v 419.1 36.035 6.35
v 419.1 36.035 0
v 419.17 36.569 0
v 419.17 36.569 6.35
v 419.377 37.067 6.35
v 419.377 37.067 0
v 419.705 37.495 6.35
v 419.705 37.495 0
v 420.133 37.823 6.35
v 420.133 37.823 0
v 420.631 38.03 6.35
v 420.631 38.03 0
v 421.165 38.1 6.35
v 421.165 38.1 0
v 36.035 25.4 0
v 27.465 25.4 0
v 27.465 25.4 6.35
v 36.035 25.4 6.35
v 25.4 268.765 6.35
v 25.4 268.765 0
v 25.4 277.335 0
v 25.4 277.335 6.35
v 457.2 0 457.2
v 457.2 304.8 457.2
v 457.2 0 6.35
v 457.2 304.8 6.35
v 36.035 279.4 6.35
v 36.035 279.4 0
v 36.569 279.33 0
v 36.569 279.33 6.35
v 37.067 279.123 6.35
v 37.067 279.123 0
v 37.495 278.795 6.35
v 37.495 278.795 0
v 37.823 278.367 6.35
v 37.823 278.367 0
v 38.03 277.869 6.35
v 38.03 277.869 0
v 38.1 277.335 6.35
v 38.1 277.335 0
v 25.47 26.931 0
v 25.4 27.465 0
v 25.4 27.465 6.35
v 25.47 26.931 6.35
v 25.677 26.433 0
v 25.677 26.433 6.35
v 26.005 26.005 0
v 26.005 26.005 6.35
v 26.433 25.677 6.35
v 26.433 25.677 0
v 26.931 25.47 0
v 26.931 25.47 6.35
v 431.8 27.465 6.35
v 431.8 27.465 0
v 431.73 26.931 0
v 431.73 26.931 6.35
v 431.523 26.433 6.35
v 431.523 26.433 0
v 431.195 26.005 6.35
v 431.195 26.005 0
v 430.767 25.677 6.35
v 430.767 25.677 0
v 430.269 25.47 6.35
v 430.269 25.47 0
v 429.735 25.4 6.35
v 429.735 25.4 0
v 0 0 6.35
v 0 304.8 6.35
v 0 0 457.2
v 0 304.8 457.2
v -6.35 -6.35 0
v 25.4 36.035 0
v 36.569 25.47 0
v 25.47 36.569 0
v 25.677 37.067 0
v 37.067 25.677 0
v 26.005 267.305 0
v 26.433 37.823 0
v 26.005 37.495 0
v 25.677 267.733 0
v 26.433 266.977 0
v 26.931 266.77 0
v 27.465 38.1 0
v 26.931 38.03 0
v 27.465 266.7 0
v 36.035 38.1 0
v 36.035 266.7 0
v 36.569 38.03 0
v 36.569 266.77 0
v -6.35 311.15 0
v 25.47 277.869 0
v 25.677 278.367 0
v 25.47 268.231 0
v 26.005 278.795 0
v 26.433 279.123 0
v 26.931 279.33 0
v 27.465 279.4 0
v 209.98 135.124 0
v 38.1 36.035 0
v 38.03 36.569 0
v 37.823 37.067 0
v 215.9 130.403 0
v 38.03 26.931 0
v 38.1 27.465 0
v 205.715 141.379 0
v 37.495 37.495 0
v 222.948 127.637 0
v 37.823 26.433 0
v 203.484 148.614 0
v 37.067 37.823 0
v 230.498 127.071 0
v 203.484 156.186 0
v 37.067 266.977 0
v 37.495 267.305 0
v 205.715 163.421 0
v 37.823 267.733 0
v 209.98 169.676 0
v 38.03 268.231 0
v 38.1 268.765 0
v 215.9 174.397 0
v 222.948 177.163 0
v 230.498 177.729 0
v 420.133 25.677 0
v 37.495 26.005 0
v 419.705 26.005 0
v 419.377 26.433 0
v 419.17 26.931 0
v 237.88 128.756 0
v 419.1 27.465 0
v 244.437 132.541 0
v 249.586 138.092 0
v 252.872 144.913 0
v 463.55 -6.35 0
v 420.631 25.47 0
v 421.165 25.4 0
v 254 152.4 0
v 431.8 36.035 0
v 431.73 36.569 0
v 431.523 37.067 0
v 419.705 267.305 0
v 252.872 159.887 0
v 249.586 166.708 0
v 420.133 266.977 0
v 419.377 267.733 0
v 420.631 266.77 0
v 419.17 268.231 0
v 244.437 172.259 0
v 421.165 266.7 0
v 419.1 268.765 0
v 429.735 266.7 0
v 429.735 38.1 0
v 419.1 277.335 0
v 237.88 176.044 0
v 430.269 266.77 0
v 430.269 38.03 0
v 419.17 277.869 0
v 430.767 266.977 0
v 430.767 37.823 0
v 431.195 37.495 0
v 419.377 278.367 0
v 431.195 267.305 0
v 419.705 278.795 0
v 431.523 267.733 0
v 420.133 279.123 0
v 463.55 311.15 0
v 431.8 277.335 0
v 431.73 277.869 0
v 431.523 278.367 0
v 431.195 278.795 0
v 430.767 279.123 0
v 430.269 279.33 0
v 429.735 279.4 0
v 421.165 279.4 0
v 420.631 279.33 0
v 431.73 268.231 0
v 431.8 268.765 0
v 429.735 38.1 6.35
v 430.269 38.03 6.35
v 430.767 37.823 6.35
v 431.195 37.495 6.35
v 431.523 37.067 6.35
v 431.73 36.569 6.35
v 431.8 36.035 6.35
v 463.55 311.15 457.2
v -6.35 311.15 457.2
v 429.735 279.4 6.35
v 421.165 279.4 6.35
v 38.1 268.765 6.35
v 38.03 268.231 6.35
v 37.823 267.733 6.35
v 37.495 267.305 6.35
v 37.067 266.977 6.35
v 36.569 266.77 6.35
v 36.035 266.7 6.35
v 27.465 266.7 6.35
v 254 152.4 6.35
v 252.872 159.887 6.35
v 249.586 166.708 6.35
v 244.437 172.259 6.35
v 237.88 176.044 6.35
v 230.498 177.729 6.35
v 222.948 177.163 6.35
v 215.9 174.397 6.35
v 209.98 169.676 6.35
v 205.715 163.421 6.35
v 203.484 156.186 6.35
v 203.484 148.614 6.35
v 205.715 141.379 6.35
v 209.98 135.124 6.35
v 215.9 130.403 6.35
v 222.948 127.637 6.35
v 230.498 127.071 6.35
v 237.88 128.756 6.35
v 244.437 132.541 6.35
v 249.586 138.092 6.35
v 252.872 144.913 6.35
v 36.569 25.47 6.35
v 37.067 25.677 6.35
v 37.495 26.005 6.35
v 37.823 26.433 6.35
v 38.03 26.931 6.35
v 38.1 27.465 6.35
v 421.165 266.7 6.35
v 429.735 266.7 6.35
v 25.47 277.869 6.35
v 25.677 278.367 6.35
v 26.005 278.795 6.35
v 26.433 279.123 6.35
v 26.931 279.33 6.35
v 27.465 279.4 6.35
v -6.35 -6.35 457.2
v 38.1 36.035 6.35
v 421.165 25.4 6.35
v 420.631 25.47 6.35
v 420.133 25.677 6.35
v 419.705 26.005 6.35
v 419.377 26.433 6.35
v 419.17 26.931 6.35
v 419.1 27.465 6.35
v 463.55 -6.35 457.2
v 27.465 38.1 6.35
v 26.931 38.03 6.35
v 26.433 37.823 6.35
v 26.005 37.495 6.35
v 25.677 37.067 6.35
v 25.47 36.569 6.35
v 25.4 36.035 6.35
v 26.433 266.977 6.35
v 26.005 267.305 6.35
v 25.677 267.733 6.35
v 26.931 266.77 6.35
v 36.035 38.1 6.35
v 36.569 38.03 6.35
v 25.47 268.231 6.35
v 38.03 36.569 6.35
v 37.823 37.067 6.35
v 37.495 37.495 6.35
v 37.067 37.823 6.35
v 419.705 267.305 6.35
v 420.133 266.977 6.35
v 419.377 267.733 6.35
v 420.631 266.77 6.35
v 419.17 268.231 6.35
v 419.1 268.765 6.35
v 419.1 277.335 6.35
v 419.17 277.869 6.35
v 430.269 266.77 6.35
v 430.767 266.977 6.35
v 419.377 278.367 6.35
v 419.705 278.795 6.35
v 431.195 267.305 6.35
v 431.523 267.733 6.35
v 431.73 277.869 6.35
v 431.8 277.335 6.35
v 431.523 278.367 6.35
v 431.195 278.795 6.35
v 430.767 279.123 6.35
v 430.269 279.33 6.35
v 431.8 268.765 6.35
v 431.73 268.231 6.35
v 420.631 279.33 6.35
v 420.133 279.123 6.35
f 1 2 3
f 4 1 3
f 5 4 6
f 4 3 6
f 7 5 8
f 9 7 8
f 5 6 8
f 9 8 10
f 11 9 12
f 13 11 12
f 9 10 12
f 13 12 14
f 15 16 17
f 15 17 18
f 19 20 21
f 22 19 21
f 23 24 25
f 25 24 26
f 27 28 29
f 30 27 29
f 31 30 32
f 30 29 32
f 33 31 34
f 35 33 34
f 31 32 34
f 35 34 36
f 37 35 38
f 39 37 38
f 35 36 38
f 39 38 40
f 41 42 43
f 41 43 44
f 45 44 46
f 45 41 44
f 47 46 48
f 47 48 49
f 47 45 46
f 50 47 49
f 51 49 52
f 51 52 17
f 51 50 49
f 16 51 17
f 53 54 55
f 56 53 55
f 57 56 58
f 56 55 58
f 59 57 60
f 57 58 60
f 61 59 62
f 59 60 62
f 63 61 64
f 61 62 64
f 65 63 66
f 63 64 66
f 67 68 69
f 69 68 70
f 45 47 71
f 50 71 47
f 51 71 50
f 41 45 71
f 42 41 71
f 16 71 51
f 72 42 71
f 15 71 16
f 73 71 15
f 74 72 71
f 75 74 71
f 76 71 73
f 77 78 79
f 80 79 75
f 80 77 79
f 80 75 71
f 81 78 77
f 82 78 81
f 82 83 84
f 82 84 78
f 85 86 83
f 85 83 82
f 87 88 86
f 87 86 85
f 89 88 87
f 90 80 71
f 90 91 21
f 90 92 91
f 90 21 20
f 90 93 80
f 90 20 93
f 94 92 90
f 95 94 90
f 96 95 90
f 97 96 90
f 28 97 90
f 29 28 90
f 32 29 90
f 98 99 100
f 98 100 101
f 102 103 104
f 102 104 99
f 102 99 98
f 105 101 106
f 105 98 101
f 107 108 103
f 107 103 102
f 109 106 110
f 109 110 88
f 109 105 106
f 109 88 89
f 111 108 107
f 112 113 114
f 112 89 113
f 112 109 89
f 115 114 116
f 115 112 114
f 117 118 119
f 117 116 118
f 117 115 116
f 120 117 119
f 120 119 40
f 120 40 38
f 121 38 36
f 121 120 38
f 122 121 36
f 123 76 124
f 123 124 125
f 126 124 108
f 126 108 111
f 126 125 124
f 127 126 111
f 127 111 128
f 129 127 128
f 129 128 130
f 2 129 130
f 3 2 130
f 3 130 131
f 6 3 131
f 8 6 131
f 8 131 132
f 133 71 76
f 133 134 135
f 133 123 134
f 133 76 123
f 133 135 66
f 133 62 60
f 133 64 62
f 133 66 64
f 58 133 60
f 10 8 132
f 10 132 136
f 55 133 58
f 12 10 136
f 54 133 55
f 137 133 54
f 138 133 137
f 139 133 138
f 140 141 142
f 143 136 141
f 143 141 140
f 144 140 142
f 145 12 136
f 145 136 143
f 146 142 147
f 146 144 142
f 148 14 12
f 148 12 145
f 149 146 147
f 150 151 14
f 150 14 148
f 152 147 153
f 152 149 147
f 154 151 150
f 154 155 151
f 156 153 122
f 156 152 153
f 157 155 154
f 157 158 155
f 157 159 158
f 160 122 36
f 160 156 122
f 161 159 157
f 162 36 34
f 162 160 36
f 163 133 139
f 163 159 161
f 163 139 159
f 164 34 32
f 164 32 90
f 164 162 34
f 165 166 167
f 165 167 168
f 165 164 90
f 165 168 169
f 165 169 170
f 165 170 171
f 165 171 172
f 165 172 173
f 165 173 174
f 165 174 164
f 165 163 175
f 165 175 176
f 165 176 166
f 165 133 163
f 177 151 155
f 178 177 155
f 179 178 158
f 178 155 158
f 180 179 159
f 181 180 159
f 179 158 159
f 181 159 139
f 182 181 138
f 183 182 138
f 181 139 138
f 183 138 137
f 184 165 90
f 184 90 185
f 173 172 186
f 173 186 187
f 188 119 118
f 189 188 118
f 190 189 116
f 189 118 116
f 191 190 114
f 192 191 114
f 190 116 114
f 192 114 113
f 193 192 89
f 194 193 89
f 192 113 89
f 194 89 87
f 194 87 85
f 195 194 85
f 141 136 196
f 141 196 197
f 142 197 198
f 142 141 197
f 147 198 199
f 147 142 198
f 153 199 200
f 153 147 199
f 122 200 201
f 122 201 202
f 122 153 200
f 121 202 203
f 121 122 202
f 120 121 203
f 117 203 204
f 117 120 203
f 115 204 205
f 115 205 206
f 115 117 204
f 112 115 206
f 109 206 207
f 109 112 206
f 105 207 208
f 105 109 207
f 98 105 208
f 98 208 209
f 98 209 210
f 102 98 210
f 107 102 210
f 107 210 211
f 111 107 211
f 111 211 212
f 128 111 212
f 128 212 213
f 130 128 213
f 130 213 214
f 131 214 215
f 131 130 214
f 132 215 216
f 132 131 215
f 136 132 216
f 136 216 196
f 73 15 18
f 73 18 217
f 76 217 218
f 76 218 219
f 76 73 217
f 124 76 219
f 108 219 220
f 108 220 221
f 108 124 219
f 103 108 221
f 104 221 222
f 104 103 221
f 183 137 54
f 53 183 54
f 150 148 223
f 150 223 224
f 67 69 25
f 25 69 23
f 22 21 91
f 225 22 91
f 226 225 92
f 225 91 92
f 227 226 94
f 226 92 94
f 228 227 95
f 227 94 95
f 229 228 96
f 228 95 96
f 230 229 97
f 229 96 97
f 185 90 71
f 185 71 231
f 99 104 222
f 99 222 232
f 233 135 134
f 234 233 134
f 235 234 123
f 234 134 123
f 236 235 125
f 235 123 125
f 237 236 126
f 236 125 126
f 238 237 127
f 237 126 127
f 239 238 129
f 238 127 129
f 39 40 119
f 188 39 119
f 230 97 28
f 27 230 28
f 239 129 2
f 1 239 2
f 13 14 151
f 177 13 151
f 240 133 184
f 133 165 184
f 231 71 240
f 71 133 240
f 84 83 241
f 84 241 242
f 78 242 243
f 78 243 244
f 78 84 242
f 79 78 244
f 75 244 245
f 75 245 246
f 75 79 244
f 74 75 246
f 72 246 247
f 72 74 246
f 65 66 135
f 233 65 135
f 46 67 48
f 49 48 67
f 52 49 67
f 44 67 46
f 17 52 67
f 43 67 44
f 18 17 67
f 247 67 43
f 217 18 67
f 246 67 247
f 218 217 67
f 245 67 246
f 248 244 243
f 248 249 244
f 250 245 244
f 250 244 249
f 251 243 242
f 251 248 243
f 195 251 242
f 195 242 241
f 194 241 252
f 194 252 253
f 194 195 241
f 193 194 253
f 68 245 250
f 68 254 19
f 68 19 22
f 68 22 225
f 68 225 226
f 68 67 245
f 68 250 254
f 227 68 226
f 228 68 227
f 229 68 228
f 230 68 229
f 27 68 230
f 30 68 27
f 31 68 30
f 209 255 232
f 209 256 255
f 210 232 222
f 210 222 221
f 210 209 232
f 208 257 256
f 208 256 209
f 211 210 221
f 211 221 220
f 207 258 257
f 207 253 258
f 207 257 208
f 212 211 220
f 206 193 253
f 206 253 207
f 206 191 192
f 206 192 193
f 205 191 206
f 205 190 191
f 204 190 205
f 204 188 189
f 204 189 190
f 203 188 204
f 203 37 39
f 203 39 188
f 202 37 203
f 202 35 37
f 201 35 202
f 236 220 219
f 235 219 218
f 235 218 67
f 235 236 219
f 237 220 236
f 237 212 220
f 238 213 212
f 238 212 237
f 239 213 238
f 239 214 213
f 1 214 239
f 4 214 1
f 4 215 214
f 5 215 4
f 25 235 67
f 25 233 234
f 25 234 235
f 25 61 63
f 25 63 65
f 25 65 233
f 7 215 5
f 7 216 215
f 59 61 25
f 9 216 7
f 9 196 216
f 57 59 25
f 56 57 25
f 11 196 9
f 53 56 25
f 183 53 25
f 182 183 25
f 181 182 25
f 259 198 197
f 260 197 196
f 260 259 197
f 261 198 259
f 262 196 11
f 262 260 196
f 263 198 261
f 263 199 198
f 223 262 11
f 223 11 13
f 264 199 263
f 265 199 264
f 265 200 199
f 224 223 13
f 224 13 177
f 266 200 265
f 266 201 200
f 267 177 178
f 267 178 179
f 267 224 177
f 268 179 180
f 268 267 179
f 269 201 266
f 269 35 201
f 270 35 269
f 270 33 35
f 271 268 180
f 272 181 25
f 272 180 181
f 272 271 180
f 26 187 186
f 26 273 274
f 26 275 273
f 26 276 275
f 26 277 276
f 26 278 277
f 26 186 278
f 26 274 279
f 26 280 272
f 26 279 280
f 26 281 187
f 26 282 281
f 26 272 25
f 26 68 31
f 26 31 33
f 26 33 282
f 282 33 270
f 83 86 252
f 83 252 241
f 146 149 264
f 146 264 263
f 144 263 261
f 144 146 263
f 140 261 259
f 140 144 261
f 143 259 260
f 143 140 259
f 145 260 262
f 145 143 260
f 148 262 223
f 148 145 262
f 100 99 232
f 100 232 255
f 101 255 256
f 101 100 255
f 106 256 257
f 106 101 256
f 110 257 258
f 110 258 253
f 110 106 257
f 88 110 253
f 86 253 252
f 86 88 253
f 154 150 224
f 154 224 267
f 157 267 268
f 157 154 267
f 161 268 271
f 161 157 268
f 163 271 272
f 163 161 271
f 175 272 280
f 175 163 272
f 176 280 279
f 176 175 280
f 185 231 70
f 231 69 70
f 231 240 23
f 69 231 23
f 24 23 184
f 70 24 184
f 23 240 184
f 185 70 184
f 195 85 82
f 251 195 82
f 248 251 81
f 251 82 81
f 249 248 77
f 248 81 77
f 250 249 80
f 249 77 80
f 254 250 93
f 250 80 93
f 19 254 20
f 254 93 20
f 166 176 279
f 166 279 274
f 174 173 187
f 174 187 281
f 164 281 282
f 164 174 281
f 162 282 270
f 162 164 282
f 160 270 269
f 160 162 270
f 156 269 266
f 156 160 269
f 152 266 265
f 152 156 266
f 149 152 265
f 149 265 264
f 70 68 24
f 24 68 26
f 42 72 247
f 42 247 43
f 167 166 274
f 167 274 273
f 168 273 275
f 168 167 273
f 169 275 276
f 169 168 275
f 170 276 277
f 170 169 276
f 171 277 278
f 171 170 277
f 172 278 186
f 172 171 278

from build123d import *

# Parameters (mm, degrees)
SKETCH1_W           = 457.2
SKETCH1_H           = 304.8
SKETCH1_R           = 25.4
CHAMBER_BASE_DEPTH  = 6.35
SKETCH2_W           = 457.2
SKETCH2_H           = 304.8
BACK_WALL_DEPTH     = 6.35
SKETCH3_W           = 463.55
SKETCH3_H           = 457.2
SIDE_WALL_2_DEPTH   = 6.35
SKETCH5_W           = 463.55
SKETCH5_H           = 457.2
SIDE_WALL_3_DEPTH   = 6.35
SKETCH6_W           = 457.2
SKETCH6_H           = 317.5
BOSS_EXTRUDE1_DEPTH = 6.35
CUT_EXTRUDE1_DEPTH  = 6.35


with BuildPart() as part:
    # Sketch1 → Chamber Base (new body)
    with BuildSketch(Plane.XY):
        with Locations((228.6, 152.4)):
            Rectangle(SKETCH1_W, SKETCH1_H)
        with Locations((228.6, 152.4)):
            Circle(SKETCH1_R, mode=Mode.SUBTRACT)
    extrude(amount=CHAMBER_BASE_DEPTH)

    # Sketch2 → Back wall (add)
    with BuildSketch(Plane(origin=(457.2, 0, 0), x_dir=(0, 0, -1), z_dir=(1, 0, 0))):
        with Locations((-228.6, 152.4)):
            Rectangle(SKETCH2_W, SKETCH2_H)
    extrude(amount=BACK_WALL_DEPTH)

    # Sketch3 → Side wall 2 (add)
    with BuildSketch(Plane(origin=(0, 304.8, 0), x_dir=(1, 0, 0), z_dir=(0, 1, 0))):
        with Locations((231.775, -228.6)):
            Rectangle(SKETCH3_W, SKETCH3_H)
    extrude(amount=SIDE_WALL_2_DEPTH)

    # Sketch5 → Side wall 3 (add)
    with BuildSketch(Plane.XZ):
        with Locations((231.775, 228.6)):
            Rectangle(SKETCH5_W, SKETCH5_H)
    extrude(amount=SIDE_WALL_3_DEPTH)

    # Sketch6 → Boss-Extrude1 (add)
    with BuildSketch(Plane.ZY):
        with Locations((228.6, 152.4)):
            Rectangle(SKETCH6_W, SKETCH6_H)
    extrude(amount=BOSS_EXTRUDE1_DEPTH)

    # Sketch7 → Cut-Extrude1 (cut)
    with BuildSketch(Plane(origin=(0, 0, 0), x_dir=(-1, 0, 0), z_dir=(0, 0, -1))):
        with BuildLine():
            Line((-429.73498, 279.4), (-421.16502, 279.4))
            ThreePointArc((-421.16502, 279.4), (-419.704830355, 278.795169645), (-419.1, 277.33498))
            Line((-419.1, 277.33498), (-419.1, 268.76502))
            ThreePointArc((-419.1, 268.76502), (-419.704830355, 267.304830355), (-421.16502, 266.7))
            Line((-421.16502, 266.7), (-429.73498, 266.7))
            ThreePointArc((-429.73498, 266.7), (-431.195169645, 267.304830355), (-431.8, 268.76502))
            Line((-431.8, 268.76502), (-431.8, 277.33498))
            ThreePointArc((-431.8, 277.33498), (-431.195169645, 278.795169645), (-429.73498, 279.4))
        make_face()
        with BuildLine():
            Line((-38.1, 277.33498), (-38.1, 268.76502))
            ThreePointArc((-38.1, 268.76502), (-37.495169645, 267.304830355), (-36.03498, 266.7))
            Line((-36.03498, 266.7), (-27.46502, 266.7))
            ThreePointArc((-27.46502, 266.7), (-26.004830355, 267.304830355), (-25.4, 268.76502))
            Line((-25.4, 268.76502), (-25.4, 277.33498))
            ThreePointArc((-25.4, 277.33498), (-26.004830355, 278.795169645), (-27.46502, 279.4))
            Line((-27.46502, 279.4), (-36.03498, 279.4))
            ThreePointArc((-36.03498, 279.4), (-37.495169645, 278.795169645), (-38.1, 277.33498))
        make_face()
        with BuildLine():
            Line((-27.46502, 25.4), (-36.03498, 25.4))
            ThreePointArc((-36.03498, 25.4), (-37.495169645, 26.004830355), (-38.1, 27.46502))
            Line((-38.1, 27.46502), (-38.1, 36.03498))
            ThreePointArc((-38.1, 36.03498), (-37.495169645, 37.495169645), (-36.03498, 38.1))
            Line((-36.03498, 38.1), (-27.46502, 38.1))
            ThreePointArc((-27.46502, 38.1), (-26.004830355, 37.495169645), (-25.4, 36.03498))
            Line((-25.4, 36.03498), (-25.4, 27.46502))
            ThreePointArc((-25.4, 27.46502), (-26.004830355, 26.004830355), (-27.46502, 25.4))
        make_face()
        with BuildLine():
            Line((-419.1, 27.46502), (-419.1, 36.03498))
            ThreePointArc((-419.1, 36.03498), (-419.704830355, 37.495169645), (-421.16502, 38.1))
            Line((-421.16502, 38.1), (-429.73498, 38.1))
            ThreePointArc((-429.73498, 38.1), (-431.195169645, 37.495169645), (-431.8, 36.03498))
            Line((-431.8, 36.03498), (-431.8, 27.46502))
            ThreePointArc((-431.8, 27.46502), (-431.195169645, 26.004830355), (-429.73498, 25.4))
            Line((-429.73498, 25.4), (-421.16502, 25.4))
            ThreePointArc((-421.16502, 25.4), (-419.704830355, 26.004830355), (-419.1, 27.46502))
        make_face()
    extrude(amount=-CUT_EXTRUDE1_DEPTH, mode=Mode.SUBTRACT)


solid = part.part
